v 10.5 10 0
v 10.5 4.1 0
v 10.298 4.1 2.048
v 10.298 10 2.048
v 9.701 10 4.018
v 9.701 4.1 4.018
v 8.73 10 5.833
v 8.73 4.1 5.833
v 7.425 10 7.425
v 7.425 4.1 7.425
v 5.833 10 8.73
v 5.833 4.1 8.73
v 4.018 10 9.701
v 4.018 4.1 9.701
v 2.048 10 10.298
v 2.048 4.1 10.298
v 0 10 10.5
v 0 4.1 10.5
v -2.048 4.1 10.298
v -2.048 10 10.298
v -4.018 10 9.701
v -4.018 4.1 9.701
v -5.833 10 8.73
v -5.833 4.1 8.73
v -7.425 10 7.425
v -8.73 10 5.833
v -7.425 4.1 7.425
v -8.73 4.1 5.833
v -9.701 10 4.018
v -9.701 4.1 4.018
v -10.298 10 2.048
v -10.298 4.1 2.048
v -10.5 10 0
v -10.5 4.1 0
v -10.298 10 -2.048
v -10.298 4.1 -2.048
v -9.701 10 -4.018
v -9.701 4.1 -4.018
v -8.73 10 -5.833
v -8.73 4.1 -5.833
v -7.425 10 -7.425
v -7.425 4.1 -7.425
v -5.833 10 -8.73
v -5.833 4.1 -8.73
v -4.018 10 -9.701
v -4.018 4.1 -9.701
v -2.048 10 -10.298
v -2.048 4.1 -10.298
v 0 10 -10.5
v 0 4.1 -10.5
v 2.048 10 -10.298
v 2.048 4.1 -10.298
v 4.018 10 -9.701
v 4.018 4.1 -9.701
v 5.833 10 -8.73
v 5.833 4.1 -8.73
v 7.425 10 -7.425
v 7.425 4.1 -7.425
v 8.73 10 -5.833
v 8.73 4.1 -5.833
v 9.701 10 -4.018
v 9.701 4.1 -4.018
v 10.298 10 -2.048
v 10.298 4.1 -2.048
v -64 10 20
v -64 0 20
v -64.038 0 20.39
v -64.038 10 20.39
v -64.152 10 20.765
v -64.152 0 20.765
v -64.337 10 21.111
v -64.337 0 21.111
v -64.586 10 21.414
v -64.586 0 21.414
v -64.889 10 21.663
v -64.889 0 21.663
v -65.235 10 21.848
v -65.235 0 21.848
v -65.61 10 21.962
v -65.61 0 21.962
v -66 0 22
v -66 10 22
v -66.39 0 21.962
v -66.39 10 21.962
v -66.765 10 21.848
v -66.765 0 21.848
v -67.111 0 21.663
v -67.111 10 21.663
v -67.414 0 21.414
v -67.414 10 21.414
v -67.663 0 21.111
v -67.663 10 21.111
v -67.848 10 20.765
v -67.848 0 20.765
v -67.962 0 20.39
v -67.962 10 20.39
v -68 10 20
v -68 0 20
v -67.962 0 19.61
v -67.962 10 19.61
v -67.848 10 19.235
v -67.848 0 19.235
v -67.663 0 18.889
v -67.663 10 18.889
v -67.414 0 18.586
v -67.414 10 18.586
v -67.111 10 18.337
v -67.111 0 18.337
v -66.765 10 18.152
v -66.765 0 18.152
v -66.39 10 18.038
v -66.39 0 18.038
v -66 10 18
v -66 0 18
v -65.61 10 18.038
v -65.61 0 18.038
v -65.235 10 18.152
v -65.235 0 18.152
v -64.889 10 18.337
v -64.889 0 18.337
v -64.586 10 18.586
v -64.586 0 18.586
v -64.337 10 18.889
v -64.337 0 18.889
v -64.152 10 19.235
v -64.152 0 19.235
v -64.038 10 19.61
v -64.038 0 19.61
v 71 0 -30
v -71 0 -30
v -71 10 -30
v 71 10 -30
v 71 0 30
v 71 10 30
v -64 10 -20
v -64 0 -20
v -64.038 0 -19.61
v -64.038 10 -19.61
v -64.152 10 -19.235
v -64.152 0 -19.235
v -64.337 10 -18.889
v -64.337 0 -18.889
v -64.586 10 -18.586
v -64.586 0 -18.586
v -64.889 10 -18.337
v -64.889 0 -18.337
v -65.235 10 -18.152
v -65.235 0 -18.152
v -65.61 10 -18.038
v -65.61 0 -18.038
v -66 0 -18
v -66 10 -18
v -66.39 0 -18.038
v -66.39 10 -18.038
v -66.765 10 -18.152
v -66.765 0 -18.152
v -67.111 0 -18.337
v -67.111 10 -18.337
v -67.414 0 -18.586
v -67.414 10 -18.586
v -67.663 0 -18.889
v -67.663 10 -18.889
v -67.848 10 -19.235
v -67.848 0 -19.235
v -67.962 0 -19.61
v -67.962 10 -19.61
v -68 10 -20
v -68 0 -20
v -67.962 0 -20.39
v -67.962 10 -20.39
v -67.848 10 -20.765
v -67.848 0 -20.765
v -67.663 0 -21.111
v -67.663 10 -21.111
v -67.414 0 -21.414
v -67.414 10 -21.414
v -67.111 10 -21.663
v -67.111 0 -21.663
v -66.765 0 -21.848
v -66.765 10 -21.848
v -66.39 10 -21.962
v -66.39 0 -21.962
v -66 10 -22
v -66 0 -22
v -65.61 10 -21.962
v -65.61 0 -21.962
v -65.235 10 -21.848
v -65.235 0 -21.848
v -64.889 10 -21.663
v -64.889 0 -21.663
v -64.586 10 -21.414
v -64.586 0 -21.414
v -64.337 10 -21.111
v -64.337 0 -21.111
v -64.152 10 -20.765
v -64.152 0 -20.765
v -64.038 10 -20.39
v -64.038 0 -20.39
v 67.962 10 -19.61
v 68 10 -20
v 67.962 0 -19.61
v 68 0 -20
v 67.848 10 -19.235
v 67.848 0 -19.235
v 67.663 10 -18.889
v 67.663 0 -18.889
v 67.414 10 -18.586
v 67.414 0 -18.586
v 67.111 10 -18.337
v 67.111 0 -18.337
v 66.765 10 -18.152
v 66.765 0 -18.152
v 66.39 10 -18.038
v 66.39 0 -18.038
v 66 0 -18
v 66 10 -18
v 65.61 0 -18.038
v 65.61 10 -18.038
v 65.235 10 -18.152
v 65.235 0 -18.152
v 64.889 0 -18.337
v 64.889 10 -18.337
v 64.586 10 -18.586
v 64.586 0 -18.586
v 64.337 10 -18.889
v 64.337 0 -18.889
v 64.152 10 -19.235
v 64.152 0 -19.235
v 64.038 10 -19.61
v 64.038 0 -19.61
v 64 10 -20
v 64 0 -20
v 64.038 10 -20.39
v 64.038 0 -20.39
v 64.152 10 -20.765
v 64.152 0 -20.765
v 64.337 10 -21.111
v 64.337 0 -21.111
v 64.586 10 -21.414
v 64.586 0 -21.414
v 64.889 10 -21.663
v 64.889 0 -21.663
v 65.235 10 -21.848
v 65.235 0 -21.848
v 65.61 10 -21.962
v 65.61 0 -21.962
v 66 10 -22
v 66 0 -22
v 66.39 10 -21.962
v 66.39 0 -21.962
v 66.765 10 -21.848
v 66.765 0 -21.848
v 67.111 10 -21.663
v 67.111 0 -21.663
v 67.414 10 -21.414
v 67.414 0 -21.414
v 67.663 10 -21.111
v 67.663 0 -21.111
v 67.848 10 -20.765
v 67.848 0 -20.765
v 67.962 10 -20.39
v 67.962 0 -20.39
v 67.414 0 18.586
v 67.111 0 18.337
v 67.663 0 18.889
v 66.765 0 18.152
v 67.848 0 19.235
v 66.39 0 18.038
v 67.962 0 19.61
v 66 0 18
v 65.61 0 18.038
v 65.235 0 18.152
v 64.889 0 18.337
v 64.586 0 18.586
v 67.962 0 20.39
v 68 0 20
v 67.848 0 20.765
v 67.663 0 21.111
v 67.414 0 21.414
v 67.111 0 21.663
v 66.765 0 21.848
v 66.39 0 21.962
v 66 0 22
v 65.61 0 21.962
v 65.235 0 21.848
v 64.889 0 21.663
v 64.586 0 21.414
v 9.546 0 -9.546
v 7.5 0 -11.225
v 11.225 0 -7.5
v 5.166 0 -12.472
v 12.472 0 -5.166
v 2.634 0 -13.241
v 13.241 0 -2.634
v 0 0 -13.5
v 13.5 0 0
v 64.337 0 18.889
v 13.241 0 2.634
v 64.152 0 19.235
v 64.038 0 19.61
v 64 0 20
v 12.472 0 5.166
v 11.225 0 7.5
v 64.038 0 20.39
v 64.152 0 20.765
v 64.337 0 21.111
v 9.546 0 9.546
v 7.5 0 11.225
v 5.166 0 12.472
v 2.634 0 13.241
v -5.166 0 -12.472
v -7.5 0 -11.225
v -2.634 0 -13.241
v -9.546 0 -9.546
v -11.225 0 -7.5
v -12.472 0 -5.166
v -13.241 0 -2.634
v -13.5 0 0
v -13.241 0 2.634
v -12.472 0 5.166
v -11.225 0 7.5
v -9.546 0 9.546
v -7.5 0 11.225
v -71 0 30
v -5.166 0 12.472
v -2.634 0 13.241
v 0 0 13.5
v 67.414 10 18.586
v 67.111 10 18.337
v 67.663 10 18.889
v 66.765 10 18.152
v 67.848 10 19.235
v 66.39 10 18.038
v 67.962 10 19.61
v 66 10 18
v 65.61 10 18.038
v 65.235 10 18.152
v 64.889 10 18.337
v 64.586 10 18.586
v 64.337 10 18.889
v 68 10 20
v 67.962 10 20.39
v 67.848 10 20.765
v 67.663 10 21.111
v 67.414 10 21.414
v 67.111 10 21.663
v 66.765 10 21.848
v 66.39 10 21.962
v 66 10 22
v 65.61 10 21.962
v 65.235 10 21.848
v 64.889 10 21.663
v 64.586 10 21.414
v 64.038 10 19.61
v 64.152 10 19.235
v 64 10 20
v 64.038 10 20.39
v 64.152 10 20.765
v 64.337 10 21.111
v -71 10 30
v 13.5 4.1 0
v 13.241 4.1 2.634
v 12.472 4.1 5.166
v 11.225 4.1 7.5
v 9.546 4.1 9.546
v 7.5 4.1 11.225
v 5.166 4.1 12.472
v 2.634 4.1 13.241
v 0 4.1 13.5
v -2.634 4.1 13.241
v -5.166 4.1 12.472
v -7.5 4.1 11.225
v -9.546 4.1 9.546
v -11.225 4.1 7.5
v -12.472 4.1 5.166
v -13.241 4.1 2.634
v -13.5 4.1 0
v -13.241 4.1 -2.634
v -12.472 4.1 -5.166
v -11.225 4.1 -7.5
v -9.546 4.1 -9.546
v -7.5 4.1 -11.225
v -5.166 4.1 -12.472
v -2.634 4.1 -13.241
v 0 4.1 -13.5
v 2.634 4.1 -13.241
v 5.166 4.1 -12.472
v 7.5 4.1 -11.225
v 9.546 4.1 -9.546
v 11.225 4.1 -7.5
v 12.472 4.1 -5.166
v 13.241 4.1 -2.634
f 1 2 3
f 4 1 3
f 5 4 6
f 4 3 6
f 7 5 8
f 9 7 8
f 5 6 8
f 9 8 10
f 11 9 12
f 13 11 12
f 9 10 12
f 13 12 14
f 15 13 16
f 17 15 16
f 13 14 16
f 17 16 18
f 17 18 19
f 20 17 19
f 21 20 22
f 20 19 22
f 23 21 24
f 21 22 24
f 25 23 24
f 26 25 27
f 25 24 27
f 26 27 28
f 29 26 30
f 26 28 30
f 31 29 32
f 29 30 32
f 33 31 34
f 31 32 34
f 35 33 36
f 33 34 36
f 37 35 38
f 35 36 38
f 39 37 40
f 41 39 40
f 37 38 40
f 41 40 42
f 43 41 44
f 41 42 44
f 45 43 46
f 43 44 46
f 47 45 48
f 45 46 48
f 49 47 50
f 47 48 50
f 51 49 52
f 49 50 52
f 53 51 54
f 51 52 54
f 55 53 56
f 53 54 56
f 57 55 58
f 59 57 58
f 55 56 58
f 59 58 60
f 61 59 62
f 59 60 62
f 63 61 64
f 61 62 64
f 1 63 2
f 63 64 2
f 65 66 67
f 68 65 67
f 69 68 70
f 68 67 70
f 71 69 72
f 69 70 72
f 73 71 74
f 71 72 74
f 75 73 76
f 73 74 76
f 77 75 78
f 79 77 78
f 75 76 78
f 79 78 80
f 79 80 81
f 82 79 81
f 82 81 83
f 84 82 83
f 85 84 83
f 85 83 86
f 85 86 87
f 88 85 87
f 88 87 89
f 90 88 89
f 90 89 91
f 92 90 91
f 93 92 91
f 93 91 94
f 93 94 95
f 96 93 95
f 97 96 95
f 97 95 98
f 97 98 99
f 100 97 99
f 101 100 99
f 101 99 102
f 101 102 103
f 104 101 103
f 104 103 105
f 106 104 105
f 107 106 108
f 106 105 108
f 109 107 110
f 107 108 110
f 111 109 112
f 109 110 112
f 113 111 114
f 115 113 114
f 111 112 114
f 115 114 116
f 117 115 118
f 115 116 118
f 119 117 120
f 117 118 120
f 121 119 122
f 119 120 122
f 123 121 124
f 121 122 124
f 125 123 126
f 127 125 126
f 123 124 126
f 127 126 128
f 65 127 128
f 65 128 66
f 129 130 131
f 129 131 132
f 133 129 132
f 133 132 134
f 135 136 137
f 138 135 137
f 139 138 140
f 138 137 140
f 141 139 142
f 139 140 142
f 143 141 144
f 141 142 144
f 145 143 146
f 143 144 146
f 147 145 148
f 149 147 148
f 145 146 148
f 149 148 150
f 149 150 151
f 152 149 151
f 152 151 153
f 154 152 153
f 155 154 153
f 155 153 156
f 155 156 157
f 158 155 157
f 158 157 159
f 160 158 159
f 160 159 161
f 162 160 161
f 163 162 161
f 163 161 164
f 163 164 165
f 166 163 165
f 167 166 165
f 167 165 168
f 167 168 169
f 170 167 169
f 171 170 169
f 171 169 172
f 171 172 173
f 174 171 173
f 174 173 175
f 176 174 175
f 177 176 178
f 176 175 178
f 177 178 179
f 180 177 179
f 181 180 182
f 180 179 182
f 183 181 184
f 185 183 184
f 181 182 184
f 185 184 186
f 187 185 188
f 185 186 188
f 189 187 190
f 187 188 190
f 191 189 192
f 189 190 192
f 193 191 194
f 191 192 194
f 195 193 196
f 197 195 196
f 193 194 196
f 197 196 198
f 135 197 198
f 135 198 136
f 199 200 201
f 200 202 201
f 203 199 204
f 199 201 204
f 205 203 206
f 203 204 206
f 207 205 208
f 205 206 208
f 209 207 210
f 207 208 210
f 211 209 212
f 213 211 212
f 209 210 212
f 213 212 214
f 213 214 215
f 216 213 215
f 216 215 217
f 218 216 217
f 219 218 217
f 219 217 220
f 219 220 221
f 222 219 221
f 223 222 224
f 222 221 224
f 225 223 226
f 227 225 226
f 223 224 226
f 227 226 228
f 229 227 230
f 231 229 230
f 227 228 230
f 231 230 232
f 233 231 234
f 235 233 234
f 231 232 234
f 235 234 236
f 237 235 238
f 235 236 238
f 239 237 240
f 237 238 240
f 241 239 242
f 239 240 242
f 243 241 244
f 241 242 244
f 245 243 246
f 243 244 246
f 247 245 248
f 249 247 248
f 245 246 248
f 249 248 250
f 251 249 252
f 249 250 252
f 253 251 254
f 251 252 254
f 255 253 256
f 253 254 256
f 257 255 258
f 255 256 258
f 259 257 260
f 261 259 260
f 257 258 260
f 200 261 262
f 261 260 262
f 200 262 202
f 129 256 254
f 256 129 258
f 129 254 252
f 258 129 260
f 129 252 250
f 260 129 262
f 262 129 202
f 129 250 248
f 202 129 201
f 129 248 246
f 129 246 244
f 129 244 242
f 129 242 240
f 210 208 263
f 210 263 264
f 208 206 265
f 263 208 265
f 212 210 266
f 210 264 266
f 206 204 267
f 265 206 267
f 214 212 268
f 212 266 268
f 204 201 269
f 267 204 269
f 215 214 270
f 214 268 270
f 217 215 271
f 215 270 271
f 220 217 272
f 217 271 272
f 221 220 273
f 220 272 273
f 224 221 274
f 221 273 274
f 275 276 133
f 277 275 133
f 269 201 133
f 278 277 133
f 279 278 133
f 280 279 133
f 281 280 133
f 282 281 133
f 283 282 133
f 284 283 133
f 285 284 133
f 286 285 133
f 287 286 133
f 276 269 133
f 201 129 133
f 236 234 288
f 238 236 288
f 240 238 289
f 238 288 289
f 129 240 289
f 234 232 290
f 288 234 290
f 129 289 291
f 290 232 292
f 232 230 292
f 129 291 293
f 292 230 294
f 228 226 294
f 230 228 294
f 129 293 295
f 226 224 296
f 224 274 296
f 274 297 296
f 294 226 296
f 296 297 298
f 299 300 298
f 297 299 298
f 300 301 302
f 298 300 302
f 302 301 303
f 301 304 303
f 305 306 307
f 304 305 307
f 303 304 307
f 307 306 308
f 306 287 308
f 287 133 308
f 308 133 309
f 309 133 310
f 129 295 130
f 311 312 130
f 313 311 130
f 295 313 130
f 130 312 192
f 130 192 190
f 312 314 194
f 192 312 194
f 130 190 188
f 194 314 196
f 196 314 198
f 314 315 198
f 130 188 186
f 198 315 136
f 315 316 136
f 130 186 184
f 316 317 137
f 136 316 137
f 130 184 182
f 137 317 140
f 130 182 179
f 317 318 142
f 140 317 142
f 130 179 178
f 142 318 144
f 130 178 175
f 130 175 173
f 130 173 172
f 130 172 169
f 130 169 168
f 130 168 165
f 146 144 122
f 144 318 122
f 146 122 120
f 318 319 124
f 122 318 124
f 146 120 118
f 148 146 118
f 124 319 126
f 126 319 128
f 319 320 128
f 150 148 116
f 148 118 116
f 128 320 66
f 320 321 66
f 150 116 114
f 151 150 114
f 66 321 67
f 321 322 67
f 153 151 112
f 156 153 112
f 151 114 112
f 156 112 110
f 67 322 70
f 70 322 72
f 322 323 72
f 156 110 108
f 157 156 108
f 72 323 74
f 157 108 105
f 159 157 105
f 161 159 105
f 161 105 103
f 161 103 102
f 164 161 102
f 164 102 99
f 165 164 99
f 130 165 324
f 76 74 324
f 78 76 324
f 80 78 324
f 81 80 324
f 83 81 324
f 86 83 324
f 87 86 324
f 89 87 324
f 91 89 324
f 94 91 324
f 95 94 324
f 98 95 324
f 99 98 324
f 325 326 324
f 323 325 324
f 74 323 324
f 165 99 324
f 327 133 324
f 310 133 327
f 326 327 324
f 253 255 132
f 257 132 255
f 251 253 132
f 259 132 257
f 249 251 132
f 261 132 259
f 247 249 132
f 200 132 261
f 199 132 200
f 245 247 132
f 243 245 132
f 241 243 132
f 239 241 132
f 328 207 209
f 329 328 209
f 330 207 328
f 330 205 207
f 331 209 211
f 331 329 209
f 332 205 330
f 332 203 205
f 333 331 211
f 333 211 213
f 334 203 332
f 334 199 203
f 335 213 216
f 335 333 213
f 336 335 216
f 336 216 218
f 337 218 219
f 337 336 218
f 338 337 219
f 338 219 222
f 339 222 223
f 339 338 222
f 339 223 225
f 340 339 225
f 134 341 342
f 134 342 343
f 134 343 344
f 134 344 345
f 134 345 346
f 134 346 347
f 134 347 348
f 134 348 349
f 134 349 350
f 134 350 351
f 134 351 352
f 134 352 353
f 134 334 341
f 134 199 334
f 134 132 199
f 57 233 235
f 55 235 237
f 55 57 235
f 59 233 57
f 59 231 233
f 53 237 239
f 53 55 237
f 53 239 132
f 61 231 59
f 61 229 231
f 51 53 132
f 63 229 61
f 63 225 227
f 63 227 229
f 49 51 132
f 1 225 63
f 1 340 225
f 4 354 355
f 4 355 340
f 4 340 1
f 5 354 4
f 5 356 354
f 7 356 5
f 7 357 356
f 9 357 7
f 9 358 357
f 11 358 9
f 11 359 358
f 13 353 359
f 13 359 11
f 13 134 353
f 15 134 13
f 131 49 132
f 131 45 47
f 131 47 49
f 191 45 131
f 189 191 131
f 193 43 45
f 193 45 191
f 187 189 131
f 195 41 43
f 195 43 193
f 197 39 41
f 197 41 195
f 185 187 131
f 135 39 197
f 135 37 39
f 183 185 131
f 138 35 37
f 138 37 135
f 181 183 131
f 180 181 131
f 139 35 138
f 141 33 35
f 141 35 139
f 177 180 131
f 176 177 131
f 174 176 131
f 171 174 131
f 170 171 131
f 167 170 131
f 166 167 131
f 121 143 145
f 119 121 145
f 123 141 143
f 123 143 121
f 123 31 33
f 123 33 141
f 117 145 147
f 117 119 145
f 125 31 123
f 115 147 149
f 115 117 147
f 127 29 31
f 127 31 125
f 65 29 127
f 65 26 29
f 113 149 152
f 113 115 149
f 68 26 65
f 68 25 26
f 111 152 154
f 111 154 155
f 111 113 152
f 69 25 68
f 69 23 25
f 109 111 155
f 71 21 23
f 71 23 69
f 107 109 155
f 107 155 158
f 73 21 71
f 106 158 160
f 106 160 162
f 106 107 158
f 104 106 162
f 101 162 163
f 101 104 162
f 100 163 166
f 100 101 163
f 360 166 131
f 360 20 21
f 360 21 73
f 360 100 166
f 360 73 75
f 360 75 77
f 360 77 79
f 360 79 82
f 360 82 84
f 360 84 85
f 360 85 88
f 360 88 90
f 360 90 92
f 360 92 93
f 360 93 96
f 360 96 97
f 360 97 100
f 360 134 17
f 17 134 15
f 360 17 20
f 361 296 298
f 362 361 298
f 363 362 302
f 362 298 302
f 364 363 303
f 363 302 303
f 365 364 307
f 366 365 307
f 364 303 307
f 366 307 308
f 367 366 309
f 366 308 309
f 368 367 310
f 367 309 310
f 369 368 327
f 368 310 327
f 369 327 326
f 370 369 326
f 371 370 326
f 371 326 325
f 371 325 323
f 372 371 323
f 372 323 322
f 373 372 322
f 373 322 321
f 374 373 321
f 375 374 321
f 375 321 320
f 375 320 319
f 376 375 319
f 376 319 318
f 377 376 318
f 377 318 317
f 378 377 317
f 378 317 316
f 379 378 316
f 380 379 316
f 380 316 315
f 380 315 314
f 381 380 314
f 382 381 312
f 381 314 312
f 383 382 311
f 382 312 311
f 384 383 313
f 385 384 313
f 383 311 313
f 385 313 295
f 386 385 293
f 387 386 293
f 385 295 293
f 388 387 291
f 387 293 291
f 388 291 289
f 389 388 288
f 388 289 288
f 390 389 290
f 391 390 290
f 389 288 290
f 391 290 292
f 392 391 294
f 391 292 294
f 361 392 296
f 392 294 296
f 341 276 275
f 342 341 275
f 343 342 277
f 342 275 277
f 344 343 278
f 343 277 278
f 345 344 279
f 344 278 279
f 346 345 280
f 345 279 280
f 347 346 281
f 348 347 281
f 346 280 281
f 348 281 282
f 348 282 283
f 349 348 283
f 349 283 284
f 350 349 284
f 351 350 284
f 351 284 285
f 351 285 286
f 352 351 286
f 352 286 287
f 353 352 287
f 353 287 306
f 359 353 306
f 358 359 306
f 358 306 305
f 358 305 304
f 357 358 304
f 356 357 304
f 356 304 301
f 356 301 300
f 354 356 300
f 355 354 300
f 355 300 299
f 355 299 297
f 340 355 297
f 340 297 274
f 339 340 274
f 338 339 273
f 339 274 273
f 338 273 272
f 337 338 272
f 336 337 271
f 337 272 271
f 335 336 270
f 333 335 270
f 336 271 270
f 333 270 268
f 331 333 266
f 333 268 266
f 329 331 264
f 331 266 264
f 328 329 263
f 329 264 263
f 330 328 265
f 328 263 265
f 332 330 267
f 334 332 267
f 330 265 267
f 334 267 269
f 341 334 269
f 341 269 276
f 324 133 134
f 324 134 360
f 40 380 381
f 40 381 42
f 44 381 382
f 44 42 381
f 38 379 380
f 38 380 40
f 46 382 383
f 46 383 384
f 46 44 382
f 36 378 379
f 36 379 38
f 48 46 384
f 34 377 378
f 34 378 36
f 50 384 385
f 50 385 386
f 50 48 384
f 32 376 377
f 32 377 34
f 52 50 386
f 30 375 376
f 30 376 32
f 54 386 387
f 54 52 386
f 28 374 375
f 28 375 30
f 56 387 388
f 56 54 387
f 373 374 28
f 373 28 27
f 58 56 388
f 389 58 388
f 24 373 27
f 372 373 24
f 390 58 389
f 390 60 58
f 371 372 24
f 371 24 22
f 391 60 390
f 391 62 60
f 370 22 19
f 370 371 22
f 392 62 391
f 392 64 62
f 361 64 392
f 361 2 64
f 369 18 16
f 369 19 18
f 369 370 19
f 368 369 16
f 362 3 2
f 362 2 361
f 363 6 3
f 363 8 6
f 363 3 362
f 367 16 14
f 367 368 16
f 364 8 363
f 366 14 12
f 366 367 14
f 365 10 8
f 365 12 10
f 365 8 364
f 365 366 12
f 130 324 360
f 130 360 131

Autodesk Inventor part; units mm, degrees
sketch "スケッチ3" plane through (0, 0, 0) normal (0, 1, 0) x (-1, 0, 0)
  line L0 (71, -30) -> (-71, -30)
  line L1 (-71, -30) -> (-71, 30)
  line L2 (-71, 30) -> (71, 30)
  line L3 (71, 30) -> (71, -30)
  line L4 (71, -30) -> (-71, 30) construction
  line L5 (-71, -30) -> (71, 30) construction
  point P0 (0, 0)
  dimension "d0" = 60
  dimension "d1" = 142
extrude "押し出し1" add sketch "スケッチ3" along normal blind 10
sketch "スケッチ4" plane through (0, 0, 0) normal (0, -1, 0) x (1, 0, 0)
  circle A0 centre (0, 0) radius 13.5
  dimension "d4" = 27
extrude "押し出し2" cut sketch "スケッチ4" against normal blind 4.1
sketch "スケッチ5" plane through (0, 4.1, 0) normal (0, -1, 0) x (1, 0, 0)
  circle A0 centre (0, 0) radius 10.5
  point P0 (0, 0)
  dimension "d7" = 21
extrude "押し出し3" cut sketch "スケッチ5" against normal blind 10
sketch "スケッチ6" plane through (0, 0, 0) normal (0, -1, 0) x (1, 0, 0)
  circle A0 centre (-66, 20) radius 2
  line L0 (-71, 30) -> (-71, -30) projected
  line L1 (71, 30) -> (-71, 30) projected
  line L2 (-99.4, 0) -> (99.4, 0) projected
  circle A1 centre (-66, -20) radius 2
  line L3 (0, -42) -> (0, 42) projected
  circle A2 centre (66, 20) radius 2
  circle A3 centre (66, -20) radius 2
  point P0 (0, 0)
  dimension "d10" = 4
  dimension "d11" = 5
  dimension "d12" = 10
extrude "押し出し4" cut sketch "スケッチ6" against normal blind 10 contours A0 | A1 | A2 | A3
properties part number "Diffbox_plate_satelite" material "アルミニウム 6061"
